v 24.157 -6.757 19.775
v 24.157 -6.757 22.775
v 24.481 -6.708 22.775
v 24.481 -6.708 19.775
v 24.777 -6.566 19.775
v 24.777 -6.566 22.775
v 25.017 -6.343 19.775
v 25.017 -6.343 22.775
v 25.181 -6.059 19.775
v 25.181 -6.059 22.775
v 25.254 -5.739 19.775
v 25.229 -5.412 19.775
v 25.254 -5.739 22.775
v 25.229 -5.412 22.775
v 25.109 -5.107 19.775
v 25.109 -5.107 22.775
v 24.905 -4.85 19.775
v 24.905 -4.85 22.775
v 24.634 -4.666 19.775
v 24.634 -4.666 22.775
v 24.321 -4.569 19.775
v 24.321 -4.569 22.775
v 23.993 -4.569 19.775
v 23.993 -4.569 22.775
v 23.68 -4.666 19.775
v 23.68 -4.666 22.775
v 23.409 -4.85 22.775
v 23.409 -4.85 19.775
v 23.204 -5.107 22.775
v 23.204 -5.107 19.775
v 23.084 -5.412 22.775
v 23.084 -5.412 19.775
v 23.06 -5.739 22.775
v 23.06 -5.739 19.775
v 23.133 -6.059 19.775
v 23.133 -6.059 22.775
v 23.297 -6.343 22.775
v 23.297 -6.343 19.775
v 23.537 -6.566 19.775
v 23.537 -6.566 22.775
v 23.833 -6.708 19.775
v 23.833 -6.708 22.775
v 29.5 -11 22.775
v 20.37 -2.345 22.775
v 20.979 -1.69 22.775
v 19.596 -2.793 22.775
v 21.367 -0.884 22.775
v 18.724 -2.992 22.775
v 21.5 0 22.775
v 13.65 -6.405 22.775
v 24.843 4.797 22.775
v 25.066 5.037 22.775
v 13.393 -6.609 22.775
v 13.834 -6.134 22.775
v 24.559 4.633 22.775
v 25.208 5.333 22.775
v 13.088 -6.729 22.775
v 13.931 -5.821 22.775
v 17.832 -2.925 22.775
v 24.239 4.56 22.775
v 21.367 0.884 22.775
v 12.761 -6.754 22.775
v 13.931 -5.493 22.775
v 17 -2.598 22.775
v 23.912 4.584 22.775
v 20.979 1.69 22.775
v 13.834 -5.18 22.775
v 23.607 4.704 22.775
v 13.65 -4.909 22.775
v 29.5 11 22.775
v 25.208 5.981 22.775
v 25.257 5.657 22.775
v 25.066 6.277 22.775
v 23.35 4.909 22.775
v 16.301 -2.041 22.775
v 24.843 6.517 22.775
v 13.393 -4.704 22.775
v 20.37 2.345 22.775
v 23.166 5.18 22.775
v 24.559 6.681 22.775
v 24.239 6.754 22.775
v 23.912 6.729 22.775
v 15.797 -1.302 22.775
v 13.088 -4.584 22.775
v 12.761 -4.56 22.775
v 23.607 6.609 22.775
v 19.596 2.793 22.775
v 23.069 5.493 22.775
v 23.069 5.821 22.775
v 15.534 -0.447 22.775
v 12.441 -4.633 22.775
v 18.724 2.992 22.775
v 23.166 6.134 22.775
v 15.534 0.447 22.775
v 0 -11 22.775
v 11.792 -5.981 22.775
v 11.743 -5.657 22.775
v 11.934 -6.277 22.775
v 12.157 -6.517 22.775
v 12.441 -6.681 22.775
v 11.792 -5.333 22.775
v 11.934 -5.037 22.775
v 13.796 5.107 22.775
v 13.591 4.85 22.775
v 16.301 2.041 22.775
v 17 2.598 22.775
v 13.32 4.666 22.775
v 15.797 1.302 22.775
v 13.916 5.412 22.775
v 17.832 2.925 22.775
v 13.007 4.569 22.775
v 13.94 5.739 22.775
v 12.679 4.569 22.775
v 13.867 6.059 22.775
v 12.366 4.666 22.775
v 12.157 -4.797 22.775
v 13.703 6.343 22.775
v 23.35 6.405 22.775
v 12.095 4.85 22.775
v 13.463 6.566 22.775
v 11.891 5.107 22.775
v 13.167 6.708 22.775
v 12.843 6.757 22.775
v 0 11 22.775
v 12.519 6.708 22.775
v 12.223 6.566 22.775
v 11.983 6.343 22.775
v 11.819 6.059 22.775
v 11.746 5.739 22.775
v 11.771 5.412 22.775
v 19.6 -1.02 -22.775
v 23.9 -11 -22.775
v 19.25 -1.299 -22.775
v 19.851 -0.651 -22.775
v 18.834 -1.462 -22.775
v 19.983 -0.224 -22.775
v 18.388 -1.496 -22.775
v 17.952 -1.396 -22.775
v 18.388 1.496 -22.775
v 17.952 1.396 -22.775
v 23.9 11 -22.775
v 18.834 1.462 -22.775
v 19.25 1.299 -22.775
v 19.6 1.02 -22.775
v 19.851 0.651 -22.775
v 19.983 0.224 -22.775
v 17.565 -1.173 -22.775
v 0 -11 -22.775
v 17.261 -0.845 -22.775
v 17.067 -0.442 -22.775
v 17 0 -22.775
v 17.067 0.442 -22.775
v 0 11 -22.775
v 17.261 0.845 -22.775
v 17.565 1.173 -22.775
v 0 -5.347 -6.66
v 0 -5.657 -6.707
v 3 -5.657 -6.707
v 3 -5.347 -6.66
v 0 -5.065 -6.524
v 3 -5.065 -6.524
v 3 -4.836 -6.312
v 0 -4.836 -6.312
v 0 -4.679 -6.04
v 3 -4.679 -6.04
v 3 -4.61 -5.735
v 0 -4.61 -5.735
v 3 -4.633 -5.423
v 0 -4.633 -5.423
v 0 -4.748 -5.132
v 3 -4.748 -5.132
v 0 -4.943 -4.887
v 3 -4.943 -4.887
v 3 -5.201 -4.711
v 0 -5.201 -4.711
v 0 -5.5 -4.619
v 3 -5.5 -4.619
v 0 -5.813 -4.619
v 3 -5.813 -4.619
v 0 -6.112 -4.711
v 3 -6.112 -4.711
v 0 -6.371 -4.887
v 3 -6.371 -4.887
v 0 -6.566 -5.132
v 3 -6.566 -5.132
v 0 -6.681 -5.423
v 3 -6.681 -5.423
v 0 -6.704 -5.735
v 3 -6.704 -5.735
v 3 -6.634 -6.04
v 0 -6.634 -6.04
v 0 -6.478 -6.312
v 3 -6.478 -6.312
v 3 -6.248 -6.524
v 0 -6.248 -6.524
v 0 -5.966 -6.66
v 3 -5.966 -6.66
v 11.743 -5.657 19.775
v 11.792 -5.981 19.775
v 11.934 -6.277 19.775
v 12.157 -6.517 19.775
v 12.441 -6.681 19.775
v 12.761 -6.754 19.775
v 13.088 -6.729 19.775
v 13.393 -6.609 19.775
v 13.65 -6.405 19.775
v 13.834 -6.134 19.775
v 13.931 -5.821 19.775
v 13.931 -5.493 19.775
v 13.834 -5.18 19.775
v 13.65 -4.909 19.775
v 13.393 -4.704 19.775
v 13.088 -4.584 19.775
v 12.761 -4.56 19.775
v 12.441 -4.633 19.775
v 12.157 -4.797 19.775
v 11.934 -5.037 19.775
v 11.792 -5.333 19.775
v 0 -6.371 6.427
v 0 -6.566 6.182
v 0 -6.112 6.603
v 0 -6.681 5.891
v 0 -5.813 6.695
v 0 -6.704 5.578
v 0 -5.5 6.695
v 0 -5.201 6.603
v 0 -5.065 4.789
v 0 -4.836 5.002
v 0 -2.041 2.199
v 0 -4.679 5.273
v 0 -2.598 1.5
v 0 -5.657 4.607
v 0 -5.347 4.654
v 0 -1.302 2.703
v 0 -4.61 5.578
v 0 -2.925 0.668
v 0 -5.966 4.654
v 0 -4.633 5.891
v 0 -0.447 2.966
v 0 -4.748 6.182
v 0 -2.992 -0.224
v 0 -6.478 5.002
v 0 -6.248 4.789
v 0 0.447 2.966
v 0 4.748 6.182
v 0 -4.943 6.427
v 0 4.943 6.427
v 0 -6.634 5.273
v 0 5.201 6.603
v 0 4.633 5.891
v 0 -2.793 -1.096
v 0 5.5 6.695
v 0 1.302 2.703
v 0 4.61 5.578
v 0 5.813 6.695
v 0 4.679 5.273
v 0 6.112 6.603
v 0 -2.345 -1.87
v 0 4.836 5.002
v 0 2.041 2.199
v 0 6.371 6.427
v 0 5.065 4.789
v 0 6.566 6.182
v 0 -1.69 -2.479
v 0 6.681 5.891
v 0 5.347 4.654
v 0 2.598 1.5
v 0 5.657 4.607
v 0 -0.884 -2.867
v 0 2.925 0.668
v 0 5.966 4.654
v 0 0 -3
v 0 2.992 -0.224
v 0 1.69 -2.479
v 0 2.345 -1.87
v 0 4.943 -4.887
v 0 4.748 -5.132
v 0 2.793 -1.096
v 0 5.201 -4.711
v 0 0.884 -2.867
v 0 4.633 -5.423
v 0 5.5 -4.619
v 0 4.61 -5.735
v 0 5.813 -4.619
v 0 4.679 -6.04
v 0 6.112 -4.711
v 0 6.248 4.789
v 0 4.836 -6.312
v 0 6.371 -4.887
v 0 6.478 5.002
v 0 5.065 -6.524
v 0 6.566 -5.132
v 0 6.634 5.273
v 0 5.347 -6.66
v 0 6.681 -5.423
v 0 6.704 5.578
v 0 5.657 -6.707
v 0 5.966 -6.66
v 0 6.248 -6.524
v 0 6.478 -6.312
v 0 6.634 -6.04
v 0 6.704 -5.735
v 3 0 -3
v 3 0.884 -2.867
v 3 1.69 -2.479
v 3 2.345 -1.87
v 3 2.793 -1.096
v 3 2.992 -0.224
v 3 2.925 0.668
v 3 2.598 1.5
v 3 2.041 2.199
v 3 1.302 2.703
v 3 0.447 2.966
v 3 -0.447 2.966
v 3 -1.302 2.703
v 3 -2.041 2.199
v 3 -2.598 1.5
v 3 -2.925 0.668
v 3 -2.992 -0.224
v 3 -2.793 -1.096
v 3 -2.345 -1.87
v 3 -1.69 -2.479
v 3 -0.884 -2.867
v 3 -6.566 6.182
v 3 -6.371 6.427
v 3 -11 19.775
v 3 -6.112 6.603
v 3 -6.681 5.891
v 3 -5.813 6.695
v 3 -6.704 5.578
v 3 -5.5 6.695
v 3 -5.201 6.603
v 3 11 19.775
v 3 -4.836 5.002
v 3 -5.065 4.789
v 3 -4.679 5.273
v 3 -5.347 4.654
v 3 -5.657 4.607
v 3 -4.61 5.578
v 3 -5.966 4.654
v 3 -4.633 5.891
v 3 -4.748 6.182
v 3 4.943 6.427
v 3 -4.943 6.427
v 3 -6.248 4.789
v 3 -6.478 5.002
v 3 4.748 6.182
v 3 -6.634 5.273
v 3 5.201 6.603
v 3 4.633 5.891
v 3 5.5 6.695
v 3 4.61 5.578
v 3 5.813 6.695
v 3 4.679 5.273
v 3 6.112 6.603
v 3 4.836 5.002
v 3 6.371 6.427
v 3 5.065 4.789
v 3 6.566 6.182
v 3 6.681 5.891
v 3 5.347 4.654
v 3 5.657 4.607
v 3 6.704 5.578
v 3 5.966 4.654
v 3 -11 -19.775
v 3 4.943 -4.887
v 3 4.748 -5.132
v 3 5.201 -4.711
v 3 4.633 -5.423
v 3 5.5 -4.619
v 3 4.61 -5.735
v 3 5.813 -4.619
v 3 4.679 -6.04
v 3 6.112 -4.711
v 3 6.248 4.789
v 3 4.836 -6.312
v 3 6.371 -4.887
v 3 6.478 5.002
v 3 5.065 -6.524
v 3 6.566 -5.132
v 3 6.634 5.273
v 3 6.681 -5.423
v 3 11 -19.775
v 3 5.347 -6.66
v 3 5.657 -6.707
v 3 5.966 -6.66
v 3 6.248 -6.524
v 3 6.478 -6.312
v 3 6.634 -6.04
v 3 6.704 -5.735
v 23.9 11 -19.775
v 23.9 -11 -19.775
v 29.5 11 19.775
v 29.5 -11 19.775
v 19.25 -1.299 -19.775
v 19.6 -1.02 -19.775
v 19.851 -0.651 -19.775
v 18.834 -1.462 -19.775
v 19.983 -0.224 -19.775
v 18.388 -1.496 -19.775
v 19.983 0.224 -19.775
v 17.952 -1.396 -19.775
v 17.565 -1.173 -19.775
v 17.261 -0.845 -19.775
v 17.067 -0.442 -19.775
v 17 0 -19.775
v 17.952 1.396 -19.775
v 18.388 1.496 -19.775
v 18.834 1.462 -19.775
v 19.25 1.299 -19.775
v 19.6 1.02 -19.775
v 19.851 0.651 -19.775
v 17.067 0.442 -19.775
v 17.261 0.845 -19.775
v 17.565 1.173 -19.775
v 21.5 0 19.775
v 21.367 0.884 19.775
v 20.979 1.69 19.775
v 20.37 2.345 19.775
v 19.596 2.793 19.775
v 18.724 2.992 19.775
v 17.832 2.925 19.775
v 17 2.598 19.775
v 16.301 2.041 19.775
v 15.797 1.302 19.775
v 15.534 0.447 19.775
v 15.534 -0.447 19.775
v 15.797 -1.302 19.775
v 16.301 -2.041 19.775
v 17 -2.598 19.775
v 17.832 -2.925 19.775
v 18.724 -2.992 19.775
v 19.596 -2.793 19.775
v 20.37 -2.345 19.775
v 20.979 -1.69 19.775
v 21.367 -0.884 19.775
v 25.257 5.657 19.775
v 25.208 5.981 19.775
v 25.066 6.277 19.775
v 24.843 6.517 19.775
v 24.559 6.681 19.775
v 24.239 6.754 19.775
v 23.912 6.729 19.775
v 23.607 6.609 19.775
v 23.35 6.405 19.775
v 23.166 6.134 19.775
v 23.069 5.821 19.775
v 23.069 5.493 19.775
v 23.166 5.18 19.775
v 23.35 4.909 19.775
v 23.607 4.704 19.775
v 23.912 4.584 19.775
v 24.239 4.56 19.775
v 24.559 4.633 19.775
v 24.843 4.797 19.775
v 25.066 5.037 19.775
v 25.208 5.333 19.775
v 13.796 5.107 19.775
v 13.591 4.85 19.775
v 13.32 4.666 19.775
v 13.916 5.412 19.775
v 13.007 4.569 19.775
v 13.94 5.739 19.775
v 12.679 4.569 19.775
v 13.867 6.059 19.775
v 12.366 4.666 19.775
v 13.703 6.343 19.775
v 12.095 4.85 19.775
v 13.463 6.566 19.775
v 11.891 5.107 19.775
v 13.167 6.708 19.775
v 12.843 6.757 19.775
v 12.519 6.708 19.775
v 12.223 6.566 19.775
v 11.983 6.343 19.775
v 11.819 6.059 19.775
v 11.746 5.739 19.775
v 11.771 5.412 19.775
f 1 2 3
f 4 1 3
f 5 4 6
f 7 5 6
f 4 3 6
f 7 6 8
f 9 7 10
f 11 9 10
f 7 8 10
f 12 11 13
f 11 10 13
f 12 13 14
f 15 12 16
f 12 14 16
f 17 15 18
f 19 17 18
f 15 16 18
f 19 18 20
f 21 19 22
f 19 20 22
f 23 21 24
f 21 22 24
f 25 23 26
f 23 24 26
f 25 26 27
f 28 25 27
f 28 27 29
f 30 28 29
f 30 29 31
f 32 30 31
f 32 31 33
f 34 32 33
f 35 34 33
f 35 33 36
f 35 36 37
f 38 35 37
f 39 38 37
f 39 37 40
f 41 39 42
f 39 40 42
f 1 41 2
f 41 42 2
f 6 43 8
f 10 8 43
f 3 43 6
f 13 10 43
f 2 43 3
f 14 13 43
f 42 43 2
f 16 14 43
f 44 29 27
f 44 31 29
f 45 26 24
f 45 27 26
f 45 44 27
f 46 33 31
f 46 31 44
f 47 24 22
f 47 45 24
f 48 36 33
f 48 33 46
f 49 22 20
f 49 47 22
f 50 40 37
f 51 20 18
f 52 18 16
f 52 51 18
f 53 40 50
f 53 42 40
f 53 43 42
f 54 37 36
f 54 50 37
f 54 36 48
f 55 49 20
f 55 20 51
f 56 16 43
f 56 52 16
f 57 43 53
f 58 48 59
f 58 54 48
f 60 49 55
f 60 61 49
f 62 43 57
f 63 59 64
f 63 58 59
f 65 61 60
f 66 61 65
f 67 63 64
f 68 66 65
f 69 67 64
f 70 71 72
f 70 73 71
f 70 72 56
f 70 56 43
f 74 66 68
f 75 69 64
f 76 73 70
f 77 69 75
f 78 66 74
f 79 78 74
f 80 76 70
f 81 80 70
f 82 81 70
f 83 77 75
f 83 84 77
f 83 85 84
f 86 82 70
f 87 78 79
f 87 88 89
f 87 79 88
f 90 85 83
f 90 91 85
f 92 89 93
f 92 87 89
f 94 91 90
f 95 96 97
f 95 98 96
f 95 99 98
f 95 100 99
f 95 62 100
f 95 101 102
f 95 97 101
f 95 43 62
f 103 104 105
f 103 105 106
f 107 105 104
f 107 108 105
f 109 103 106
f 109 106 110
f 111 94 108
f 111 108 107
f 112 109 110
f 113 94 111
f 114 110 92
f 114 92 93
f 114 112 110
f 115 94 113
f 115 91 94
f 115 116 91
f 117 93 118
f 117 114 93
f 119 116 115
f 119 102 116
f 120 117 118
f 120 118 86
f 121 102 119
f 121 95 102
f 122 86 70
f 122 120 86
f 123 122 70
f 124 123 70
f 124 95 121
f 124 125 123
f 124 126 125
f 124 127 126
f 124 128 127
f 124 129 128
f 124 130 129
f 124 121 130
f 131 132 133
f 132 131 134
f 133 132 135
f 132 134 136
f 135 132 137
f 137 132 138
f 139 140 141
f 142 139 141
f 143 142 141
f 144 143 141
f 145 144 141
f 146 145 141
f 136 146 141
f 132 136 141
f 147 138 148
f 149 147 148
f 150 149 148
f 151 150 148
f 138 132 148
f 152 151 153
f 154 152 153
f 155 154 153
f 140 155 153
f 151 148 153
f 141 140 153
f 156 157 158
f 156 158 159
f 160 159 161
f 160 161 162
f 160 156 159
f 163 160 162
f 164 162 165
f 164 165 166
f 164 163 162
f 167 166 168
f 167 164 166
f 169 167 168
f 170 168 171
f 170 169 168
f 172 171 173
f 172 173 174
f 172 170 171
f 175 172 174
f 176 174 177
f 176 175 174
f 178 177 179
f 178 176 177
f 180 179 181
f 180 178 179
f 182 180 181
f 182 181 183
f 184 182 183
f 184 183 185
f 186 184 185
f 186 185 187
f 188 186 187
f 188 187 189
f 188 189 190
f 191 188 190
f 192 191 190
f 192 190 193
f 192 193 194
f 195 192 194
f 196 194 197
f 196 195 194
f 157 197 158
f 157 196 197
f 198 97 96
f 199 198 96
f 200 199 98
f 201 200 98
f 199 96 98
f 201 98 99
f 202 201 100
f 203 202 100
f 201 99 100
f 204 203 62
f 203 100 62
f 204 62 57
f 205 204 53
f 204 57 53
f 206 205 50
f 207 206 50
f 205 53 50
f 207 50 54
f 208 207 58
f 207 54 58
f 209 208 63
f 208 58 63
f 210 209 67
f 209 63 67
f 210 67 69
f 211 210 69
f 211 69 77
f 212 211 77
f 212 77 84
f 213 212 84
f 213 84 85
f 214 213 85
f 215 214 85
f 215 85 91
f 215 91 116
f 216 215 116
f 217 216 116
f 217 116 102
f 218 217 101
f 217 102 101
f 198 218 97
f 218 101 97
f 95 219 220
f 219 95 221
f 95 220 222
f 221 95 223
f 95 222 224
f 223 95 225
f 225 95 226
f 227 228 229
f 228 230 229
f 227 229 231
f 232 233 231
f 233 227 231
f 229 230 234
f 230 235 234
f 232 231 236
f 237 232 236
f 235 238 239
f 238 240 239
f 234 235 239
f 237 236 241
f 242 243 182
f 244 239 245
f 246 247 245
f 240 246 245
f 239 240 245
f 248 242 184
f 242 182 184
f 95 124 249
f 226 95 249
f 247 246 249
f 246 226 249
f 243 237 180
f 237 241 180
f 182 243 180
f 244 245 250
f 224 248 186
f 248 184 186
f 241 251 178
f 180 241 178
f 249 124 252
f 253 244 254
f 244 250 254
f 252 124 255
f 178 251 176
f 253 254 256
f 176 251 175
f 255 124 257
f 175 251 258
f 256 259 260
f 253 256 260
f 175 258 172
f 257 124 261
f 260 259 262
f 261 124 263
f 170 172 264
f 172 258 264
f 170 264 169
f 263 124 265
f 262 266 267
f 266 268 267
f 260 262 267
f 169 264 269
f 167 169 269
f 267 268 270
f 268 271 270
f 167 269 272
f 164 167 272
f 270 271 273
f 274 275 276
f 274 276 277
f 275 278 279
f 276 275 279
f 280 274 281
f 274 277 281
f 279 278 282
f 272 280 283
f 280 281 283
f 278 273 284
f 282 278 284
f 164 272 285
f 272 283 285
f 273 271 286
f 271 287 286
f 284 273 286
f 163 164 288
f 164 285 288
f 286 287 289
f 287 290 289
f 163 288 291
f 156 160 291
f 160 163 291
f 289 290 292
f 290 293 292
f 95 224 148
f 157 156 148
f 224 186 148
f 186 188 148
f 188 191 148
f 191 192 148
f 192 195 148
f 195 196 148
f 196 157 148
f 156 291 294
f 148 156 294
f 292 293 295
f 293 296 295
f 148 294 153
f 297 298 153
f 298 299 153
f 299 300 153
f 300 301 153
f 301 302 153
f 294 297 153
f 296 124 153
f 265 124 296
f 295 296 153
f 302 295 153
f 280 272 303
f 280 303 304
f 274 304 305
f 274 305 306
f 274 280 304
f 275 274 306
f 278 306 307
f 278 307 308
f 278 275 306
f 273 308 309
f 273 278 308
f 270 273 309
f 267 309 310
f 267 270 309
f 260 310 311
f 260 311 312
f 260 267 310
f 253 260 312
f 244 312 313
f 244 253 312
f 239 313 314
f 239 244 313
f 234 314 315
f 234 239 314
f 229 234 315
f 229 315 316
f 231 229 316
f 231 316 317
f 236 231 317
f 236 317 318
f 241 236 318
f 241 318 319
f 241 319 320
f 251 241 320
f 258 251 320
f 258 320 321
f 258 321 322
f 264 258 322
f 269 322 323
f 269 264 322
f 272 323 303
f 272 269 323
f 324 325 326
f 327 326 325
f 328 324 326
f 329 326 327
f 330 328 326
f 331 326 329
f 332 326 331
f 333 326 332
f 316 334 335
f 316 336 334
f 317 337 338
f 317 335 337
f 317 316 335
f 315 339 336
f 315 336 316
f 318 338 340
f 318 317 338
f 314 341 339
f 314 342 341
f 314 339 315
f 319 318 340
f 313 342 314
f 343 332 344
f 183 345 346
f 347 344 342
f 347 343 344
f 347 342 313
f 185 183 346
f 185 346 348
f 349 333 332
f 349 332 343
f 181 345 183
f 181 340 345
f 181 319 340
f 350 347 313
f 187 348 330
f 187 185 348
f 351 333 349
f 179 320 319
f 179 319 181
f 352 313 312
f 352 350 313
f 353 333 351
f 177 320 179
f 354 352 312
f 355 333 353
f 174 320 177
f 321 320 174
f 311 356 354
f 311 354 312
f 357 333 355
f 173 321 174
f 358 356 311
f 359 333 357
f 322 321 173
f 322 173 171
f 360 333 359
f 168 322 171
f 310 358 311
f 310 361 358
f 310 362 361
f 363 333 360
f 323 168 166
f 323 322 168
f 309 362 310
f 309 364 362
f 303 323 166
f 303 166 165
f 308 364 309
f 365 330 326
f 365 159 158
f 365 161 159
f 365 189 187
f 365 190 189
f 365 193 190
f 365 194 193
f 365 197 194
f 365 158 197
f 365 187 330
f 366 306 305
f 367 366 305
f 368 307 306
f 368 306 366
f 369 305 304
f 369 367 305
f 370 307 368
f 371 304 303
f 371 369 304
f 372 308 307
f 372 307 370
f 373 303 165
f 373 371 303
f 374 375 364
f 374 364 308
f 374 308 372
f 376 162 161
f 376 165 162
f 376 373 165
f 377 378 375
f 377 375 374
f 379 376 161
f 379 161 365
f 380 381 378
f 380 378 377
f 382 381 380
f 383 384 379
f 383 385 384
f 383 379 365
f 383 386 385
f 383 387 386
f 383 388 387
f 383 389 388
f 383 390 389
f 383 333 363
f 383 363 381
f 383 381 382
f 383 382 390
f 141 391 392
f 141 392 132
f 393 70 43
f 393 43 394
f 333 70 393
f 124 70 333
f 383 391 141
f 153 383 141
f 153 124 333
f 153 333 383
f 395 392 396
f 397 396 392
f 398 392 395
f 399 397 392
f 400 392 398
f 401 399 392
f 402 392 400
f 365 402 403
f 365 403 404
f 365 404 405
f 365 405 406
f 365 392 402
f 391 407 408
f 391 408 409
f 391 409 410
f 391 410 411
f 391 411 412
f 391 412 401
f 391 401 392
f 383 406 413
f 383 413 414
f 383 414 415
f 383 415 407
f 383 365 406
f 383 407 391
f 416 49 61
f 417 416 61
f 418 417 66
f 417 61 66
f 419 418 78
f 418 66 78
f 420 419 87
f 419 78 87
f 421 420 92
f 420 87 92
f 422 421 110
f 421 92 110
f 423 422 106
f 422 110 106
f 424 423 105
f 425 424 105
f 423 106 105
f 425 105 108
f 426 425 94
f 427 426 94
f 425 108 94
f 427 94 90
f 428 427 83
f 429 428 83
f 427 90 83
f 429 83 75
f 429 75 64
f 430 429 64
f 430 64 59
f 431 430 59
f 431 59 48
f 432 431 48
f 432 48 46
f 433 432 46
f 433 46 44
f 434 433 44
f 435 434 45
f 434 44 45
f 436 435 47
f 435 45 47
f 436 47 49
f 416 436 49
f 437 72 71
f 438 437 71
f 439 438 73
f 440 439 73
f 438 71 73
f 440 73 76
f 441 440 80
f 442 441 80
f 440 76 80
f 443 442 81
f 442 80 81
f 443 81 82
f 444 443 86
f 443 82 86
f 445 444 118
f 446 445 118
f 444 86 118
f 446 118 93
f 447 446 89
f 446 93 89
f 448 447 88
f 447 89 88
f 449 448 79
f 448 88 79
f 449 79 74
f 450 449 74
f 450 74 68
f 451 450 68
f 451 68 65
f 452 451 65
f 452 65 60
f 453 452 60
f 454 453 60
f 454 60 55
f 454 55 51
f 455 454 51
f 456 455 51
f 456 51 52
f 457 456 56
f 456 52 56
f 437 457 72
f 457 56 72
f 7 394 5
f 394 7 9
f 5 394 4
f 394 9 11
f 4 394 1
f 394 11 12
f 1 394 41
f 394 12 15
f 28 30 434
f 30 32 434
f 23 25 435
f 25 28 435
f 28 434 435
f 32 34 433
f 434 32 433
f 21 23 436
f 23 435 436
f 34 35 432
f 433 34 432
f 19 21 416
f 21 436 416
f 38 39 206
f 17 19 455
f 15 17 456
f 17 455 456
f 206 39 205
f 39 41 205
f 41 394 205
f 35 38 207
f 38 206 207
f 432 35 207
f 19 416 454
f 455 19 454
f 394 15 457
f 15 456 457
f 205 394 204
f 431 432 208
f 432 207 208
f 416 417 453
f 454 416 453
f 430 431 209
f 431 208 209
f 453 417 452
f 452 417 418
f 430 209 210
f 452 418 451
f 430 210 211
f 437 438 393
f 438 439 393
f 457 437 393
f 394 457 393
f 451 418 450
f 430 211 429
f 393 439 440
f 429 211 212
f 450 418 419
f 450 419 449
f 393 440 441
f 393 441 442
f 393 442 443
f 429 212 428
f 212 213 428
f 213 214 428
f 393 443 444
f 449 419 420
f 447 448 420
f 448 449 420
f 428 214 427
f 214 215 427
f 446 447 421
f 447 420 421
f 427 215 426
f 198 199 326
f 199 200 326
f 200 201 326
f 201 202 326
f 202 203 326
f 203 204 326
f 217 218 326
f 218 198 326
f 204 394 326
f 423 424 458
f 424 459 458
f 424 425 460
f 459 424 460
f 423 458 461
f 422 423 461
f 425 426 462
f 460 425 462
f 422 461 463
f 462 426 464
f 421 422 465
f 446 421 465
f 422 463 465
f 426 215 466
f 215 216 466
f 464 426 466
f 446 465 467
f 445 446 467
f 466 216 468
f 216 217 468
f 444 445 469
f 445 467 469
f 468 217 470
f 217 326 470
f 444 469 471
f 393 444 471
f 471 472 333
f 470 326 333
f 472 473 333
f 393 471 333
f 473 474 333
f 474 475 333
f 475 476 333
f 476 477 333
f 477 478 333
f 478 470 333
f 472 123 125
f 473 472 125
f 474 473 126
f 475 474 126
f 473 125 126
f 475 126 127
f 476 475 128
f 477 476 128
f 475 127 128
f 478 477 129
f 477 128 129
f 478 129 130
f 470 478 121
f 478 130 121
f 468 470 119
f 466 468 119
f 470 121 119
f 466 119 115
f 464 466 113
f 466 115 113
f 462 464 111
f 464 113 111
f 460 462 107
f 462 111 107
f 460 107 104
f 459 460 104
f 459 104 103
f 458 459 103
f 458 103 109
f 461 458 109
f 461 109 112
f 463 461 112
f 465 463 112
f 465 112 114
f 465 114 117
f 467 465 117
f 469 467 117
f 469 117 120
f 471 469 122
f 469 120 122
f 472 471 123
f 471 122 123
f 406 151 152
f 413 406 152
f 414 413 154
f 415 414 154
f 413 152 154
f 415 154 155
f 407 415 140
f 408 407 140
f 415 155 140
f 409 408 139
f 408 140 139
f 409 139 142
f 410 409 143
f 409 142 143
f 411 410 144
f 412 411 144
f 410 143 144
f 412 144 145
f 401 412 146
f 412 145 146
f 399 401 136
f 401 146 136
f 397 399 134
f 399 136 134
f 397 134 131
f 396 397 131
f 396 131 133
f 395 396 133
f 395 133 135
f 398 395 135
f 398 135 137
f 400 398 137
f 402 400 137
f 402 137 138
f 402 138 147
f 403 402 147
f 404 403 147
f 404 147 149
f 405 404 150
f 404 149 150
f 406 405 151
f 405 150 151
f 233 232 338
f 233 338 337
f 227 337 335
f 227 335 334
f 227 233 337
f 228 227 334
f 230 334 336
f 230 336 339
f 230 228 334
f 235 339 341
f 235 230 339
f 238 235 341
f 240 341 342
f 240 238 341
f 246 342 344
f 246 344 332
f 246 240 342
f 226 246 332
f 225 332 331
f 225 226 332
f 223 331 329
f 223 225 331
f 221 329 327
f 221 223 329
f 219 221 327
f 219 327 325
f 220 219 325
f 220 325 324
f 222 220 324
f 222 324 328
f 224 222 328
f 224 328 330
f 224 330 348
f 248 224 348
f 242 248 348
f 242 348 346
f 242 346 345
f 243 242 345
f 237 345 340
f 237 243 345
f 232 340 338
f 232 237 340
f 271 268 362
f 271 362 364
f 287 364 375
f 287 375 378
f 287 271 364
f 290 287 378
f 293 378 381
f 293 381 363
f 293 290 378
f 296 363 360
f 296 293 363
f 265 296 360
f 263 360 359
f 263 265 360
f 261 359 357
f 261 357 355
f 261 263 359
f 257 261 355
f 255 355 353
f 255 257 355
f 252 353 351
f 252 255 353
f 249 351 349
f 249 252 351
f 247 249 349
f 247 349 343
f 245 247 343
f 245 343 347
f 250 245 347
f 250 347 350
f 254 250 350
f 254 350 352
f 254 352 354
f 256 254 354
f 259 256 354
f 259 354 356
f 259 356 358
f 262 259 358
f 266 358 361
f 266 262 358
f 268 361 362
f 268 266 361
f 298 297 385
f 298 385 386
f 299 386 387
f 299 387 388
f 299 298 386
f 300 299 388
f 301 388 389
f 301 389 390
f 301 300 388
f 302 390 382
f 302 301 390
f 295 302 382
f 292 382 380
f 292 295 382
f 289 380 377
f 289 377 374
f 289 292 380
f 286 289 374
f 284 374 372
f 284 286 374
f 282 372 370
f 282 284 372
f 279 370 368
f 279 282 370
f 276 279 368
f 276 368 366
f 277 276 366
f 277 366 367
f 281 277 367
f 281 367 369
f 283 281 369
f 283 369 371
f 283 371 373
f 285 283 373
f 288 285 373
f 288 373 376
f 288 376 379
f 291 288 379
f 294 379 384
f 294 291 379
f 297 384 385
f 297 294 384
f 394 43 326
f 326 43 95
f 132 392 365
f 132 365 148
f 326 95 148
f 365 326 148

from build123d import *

# Parameters (mm, degrees)
SKETCH1_W           = 39.55
SKETCH1_H           = 22
SKETCH1_R           = 1.05
SKETCH1_R_2         = 3
BOSS_EXTRUDE1_DEPTH = 3
SKETCH1_6_W         = 3
SKETCH1_6_H         = 22
BOSS_EXTRUDE2_DEPTH = 29.5
SKETCH1_7_W         = 3
SKETCH1_7_H         = 22
BOSS_EXTRUDE3_DEPTH = 23.9
SKETCH2_R           = 3
SKETCH2_R_2         = 1.1
CUT_EXTRUDE1_DEPTH  = 3
CIRPATTERN1_COUNT   = 4
SKETCH3_R           = 1.5
CUT_EXTRUDE2_DEPTH  = 3


with BuildPart() as part:
    # Sketch1 → Boss-Extrude1 (new body)
    with BuildSketch(Plane(origin=(0, 0, 0), x_dir=(0, 0, -1), z_dir=(1, 0, 0))):
        Rectangle(SKETCH1_W, SKETCH1_H)
        with Locations((-5.656854249, -5.656854249)):
            Circle(SKETCH1_R, mode=Mode.SUBTRACT)
        with Locations((5.656854249, -5.656854249)):
            Circle(SKETCH1_R, mode=Mode.SUBTRACT)
        with Locations((-5.656854249, 5.656854249)):
            Circle(SKETCH1_R, mode=Mode.SUBTRACT)
        Circle(SKETCH1_R_2, mode=Mode.SUBTRACT)
        with Locations((5.656854249, 5.656854249)):
            Circle(SKETCH1_R, mode=Mode.SUBTRACT)
    extrude(amount=BOSS_EXTRUDE1_DEPTH)

    # Sketch1<6> → Boss-Extrude2 (add)
    with BuildSketch(Plane(origin=(0, 0, 0), x_dir=(0, 0, -1), z_dir=(1, 0, 0))):
        with Locations((-21.275, 0)):
            Rectangle(SKETCH1_6_W, SKETCH1_6_H)
    extrude(amount=BOSS_EXTRUDE2_DEPTH)

    # Sketch1<7> → Boss-Extrude3 (add)
    with BuildSketch(Plane(origin=(0, 0, 0), x_dir=(0, 0, -1), z_dir=(1, 0, 0))):
        with Locations((21.275, 0)):
            Rectangle(SKETCH1_7_W, SKETCH1_7_H)
    extrude(amount=BOSS_EXTRUDE3_DEPTH)

    # Sketch2 → Cut-Extrude1 (cut)
    with BuildSketch(Plane.XY.offset(22.775)):
        with Locations((18.5, 0)):
            Circle(SKETCH2_R)
        with Locations((24.156854249, 5.656854249)):
            Circle(SKETCH2_R_2)
    cut_extrude1 = extrude(amount=-CUT_EXTRUDE1_DEPTH, mode=Mode.SUBTRACT)

    # CirPattern1: Cut-Extrude1 ×4 about axis
    cirpattern1_axis = Axis((18.5, 0, 0), (0, 0, 1))
    for i in range(1, CIRPATTERN1_COUNT):
        add(cut_extrude1.rotate(cirpattern1_axis, i * 360 / CIRPATTERN1_COUNT), mode=Mode.SUBTRACT)

    # Sketch3 → Cut-Extrude2 (cut)
    with BuildSketch(Plane(origin=(0, 0, -22.775), x_dir=(-1, 0, 0), z_dir=(0, 0, -1))):
        with Locations((-18.5, 0)):
            Circle(SKETCH3_R)
    extrude(amount=-CUT_EXTRUDE2_DEPTH, mode=Mode.SUBTRACT)


solid = part.part
